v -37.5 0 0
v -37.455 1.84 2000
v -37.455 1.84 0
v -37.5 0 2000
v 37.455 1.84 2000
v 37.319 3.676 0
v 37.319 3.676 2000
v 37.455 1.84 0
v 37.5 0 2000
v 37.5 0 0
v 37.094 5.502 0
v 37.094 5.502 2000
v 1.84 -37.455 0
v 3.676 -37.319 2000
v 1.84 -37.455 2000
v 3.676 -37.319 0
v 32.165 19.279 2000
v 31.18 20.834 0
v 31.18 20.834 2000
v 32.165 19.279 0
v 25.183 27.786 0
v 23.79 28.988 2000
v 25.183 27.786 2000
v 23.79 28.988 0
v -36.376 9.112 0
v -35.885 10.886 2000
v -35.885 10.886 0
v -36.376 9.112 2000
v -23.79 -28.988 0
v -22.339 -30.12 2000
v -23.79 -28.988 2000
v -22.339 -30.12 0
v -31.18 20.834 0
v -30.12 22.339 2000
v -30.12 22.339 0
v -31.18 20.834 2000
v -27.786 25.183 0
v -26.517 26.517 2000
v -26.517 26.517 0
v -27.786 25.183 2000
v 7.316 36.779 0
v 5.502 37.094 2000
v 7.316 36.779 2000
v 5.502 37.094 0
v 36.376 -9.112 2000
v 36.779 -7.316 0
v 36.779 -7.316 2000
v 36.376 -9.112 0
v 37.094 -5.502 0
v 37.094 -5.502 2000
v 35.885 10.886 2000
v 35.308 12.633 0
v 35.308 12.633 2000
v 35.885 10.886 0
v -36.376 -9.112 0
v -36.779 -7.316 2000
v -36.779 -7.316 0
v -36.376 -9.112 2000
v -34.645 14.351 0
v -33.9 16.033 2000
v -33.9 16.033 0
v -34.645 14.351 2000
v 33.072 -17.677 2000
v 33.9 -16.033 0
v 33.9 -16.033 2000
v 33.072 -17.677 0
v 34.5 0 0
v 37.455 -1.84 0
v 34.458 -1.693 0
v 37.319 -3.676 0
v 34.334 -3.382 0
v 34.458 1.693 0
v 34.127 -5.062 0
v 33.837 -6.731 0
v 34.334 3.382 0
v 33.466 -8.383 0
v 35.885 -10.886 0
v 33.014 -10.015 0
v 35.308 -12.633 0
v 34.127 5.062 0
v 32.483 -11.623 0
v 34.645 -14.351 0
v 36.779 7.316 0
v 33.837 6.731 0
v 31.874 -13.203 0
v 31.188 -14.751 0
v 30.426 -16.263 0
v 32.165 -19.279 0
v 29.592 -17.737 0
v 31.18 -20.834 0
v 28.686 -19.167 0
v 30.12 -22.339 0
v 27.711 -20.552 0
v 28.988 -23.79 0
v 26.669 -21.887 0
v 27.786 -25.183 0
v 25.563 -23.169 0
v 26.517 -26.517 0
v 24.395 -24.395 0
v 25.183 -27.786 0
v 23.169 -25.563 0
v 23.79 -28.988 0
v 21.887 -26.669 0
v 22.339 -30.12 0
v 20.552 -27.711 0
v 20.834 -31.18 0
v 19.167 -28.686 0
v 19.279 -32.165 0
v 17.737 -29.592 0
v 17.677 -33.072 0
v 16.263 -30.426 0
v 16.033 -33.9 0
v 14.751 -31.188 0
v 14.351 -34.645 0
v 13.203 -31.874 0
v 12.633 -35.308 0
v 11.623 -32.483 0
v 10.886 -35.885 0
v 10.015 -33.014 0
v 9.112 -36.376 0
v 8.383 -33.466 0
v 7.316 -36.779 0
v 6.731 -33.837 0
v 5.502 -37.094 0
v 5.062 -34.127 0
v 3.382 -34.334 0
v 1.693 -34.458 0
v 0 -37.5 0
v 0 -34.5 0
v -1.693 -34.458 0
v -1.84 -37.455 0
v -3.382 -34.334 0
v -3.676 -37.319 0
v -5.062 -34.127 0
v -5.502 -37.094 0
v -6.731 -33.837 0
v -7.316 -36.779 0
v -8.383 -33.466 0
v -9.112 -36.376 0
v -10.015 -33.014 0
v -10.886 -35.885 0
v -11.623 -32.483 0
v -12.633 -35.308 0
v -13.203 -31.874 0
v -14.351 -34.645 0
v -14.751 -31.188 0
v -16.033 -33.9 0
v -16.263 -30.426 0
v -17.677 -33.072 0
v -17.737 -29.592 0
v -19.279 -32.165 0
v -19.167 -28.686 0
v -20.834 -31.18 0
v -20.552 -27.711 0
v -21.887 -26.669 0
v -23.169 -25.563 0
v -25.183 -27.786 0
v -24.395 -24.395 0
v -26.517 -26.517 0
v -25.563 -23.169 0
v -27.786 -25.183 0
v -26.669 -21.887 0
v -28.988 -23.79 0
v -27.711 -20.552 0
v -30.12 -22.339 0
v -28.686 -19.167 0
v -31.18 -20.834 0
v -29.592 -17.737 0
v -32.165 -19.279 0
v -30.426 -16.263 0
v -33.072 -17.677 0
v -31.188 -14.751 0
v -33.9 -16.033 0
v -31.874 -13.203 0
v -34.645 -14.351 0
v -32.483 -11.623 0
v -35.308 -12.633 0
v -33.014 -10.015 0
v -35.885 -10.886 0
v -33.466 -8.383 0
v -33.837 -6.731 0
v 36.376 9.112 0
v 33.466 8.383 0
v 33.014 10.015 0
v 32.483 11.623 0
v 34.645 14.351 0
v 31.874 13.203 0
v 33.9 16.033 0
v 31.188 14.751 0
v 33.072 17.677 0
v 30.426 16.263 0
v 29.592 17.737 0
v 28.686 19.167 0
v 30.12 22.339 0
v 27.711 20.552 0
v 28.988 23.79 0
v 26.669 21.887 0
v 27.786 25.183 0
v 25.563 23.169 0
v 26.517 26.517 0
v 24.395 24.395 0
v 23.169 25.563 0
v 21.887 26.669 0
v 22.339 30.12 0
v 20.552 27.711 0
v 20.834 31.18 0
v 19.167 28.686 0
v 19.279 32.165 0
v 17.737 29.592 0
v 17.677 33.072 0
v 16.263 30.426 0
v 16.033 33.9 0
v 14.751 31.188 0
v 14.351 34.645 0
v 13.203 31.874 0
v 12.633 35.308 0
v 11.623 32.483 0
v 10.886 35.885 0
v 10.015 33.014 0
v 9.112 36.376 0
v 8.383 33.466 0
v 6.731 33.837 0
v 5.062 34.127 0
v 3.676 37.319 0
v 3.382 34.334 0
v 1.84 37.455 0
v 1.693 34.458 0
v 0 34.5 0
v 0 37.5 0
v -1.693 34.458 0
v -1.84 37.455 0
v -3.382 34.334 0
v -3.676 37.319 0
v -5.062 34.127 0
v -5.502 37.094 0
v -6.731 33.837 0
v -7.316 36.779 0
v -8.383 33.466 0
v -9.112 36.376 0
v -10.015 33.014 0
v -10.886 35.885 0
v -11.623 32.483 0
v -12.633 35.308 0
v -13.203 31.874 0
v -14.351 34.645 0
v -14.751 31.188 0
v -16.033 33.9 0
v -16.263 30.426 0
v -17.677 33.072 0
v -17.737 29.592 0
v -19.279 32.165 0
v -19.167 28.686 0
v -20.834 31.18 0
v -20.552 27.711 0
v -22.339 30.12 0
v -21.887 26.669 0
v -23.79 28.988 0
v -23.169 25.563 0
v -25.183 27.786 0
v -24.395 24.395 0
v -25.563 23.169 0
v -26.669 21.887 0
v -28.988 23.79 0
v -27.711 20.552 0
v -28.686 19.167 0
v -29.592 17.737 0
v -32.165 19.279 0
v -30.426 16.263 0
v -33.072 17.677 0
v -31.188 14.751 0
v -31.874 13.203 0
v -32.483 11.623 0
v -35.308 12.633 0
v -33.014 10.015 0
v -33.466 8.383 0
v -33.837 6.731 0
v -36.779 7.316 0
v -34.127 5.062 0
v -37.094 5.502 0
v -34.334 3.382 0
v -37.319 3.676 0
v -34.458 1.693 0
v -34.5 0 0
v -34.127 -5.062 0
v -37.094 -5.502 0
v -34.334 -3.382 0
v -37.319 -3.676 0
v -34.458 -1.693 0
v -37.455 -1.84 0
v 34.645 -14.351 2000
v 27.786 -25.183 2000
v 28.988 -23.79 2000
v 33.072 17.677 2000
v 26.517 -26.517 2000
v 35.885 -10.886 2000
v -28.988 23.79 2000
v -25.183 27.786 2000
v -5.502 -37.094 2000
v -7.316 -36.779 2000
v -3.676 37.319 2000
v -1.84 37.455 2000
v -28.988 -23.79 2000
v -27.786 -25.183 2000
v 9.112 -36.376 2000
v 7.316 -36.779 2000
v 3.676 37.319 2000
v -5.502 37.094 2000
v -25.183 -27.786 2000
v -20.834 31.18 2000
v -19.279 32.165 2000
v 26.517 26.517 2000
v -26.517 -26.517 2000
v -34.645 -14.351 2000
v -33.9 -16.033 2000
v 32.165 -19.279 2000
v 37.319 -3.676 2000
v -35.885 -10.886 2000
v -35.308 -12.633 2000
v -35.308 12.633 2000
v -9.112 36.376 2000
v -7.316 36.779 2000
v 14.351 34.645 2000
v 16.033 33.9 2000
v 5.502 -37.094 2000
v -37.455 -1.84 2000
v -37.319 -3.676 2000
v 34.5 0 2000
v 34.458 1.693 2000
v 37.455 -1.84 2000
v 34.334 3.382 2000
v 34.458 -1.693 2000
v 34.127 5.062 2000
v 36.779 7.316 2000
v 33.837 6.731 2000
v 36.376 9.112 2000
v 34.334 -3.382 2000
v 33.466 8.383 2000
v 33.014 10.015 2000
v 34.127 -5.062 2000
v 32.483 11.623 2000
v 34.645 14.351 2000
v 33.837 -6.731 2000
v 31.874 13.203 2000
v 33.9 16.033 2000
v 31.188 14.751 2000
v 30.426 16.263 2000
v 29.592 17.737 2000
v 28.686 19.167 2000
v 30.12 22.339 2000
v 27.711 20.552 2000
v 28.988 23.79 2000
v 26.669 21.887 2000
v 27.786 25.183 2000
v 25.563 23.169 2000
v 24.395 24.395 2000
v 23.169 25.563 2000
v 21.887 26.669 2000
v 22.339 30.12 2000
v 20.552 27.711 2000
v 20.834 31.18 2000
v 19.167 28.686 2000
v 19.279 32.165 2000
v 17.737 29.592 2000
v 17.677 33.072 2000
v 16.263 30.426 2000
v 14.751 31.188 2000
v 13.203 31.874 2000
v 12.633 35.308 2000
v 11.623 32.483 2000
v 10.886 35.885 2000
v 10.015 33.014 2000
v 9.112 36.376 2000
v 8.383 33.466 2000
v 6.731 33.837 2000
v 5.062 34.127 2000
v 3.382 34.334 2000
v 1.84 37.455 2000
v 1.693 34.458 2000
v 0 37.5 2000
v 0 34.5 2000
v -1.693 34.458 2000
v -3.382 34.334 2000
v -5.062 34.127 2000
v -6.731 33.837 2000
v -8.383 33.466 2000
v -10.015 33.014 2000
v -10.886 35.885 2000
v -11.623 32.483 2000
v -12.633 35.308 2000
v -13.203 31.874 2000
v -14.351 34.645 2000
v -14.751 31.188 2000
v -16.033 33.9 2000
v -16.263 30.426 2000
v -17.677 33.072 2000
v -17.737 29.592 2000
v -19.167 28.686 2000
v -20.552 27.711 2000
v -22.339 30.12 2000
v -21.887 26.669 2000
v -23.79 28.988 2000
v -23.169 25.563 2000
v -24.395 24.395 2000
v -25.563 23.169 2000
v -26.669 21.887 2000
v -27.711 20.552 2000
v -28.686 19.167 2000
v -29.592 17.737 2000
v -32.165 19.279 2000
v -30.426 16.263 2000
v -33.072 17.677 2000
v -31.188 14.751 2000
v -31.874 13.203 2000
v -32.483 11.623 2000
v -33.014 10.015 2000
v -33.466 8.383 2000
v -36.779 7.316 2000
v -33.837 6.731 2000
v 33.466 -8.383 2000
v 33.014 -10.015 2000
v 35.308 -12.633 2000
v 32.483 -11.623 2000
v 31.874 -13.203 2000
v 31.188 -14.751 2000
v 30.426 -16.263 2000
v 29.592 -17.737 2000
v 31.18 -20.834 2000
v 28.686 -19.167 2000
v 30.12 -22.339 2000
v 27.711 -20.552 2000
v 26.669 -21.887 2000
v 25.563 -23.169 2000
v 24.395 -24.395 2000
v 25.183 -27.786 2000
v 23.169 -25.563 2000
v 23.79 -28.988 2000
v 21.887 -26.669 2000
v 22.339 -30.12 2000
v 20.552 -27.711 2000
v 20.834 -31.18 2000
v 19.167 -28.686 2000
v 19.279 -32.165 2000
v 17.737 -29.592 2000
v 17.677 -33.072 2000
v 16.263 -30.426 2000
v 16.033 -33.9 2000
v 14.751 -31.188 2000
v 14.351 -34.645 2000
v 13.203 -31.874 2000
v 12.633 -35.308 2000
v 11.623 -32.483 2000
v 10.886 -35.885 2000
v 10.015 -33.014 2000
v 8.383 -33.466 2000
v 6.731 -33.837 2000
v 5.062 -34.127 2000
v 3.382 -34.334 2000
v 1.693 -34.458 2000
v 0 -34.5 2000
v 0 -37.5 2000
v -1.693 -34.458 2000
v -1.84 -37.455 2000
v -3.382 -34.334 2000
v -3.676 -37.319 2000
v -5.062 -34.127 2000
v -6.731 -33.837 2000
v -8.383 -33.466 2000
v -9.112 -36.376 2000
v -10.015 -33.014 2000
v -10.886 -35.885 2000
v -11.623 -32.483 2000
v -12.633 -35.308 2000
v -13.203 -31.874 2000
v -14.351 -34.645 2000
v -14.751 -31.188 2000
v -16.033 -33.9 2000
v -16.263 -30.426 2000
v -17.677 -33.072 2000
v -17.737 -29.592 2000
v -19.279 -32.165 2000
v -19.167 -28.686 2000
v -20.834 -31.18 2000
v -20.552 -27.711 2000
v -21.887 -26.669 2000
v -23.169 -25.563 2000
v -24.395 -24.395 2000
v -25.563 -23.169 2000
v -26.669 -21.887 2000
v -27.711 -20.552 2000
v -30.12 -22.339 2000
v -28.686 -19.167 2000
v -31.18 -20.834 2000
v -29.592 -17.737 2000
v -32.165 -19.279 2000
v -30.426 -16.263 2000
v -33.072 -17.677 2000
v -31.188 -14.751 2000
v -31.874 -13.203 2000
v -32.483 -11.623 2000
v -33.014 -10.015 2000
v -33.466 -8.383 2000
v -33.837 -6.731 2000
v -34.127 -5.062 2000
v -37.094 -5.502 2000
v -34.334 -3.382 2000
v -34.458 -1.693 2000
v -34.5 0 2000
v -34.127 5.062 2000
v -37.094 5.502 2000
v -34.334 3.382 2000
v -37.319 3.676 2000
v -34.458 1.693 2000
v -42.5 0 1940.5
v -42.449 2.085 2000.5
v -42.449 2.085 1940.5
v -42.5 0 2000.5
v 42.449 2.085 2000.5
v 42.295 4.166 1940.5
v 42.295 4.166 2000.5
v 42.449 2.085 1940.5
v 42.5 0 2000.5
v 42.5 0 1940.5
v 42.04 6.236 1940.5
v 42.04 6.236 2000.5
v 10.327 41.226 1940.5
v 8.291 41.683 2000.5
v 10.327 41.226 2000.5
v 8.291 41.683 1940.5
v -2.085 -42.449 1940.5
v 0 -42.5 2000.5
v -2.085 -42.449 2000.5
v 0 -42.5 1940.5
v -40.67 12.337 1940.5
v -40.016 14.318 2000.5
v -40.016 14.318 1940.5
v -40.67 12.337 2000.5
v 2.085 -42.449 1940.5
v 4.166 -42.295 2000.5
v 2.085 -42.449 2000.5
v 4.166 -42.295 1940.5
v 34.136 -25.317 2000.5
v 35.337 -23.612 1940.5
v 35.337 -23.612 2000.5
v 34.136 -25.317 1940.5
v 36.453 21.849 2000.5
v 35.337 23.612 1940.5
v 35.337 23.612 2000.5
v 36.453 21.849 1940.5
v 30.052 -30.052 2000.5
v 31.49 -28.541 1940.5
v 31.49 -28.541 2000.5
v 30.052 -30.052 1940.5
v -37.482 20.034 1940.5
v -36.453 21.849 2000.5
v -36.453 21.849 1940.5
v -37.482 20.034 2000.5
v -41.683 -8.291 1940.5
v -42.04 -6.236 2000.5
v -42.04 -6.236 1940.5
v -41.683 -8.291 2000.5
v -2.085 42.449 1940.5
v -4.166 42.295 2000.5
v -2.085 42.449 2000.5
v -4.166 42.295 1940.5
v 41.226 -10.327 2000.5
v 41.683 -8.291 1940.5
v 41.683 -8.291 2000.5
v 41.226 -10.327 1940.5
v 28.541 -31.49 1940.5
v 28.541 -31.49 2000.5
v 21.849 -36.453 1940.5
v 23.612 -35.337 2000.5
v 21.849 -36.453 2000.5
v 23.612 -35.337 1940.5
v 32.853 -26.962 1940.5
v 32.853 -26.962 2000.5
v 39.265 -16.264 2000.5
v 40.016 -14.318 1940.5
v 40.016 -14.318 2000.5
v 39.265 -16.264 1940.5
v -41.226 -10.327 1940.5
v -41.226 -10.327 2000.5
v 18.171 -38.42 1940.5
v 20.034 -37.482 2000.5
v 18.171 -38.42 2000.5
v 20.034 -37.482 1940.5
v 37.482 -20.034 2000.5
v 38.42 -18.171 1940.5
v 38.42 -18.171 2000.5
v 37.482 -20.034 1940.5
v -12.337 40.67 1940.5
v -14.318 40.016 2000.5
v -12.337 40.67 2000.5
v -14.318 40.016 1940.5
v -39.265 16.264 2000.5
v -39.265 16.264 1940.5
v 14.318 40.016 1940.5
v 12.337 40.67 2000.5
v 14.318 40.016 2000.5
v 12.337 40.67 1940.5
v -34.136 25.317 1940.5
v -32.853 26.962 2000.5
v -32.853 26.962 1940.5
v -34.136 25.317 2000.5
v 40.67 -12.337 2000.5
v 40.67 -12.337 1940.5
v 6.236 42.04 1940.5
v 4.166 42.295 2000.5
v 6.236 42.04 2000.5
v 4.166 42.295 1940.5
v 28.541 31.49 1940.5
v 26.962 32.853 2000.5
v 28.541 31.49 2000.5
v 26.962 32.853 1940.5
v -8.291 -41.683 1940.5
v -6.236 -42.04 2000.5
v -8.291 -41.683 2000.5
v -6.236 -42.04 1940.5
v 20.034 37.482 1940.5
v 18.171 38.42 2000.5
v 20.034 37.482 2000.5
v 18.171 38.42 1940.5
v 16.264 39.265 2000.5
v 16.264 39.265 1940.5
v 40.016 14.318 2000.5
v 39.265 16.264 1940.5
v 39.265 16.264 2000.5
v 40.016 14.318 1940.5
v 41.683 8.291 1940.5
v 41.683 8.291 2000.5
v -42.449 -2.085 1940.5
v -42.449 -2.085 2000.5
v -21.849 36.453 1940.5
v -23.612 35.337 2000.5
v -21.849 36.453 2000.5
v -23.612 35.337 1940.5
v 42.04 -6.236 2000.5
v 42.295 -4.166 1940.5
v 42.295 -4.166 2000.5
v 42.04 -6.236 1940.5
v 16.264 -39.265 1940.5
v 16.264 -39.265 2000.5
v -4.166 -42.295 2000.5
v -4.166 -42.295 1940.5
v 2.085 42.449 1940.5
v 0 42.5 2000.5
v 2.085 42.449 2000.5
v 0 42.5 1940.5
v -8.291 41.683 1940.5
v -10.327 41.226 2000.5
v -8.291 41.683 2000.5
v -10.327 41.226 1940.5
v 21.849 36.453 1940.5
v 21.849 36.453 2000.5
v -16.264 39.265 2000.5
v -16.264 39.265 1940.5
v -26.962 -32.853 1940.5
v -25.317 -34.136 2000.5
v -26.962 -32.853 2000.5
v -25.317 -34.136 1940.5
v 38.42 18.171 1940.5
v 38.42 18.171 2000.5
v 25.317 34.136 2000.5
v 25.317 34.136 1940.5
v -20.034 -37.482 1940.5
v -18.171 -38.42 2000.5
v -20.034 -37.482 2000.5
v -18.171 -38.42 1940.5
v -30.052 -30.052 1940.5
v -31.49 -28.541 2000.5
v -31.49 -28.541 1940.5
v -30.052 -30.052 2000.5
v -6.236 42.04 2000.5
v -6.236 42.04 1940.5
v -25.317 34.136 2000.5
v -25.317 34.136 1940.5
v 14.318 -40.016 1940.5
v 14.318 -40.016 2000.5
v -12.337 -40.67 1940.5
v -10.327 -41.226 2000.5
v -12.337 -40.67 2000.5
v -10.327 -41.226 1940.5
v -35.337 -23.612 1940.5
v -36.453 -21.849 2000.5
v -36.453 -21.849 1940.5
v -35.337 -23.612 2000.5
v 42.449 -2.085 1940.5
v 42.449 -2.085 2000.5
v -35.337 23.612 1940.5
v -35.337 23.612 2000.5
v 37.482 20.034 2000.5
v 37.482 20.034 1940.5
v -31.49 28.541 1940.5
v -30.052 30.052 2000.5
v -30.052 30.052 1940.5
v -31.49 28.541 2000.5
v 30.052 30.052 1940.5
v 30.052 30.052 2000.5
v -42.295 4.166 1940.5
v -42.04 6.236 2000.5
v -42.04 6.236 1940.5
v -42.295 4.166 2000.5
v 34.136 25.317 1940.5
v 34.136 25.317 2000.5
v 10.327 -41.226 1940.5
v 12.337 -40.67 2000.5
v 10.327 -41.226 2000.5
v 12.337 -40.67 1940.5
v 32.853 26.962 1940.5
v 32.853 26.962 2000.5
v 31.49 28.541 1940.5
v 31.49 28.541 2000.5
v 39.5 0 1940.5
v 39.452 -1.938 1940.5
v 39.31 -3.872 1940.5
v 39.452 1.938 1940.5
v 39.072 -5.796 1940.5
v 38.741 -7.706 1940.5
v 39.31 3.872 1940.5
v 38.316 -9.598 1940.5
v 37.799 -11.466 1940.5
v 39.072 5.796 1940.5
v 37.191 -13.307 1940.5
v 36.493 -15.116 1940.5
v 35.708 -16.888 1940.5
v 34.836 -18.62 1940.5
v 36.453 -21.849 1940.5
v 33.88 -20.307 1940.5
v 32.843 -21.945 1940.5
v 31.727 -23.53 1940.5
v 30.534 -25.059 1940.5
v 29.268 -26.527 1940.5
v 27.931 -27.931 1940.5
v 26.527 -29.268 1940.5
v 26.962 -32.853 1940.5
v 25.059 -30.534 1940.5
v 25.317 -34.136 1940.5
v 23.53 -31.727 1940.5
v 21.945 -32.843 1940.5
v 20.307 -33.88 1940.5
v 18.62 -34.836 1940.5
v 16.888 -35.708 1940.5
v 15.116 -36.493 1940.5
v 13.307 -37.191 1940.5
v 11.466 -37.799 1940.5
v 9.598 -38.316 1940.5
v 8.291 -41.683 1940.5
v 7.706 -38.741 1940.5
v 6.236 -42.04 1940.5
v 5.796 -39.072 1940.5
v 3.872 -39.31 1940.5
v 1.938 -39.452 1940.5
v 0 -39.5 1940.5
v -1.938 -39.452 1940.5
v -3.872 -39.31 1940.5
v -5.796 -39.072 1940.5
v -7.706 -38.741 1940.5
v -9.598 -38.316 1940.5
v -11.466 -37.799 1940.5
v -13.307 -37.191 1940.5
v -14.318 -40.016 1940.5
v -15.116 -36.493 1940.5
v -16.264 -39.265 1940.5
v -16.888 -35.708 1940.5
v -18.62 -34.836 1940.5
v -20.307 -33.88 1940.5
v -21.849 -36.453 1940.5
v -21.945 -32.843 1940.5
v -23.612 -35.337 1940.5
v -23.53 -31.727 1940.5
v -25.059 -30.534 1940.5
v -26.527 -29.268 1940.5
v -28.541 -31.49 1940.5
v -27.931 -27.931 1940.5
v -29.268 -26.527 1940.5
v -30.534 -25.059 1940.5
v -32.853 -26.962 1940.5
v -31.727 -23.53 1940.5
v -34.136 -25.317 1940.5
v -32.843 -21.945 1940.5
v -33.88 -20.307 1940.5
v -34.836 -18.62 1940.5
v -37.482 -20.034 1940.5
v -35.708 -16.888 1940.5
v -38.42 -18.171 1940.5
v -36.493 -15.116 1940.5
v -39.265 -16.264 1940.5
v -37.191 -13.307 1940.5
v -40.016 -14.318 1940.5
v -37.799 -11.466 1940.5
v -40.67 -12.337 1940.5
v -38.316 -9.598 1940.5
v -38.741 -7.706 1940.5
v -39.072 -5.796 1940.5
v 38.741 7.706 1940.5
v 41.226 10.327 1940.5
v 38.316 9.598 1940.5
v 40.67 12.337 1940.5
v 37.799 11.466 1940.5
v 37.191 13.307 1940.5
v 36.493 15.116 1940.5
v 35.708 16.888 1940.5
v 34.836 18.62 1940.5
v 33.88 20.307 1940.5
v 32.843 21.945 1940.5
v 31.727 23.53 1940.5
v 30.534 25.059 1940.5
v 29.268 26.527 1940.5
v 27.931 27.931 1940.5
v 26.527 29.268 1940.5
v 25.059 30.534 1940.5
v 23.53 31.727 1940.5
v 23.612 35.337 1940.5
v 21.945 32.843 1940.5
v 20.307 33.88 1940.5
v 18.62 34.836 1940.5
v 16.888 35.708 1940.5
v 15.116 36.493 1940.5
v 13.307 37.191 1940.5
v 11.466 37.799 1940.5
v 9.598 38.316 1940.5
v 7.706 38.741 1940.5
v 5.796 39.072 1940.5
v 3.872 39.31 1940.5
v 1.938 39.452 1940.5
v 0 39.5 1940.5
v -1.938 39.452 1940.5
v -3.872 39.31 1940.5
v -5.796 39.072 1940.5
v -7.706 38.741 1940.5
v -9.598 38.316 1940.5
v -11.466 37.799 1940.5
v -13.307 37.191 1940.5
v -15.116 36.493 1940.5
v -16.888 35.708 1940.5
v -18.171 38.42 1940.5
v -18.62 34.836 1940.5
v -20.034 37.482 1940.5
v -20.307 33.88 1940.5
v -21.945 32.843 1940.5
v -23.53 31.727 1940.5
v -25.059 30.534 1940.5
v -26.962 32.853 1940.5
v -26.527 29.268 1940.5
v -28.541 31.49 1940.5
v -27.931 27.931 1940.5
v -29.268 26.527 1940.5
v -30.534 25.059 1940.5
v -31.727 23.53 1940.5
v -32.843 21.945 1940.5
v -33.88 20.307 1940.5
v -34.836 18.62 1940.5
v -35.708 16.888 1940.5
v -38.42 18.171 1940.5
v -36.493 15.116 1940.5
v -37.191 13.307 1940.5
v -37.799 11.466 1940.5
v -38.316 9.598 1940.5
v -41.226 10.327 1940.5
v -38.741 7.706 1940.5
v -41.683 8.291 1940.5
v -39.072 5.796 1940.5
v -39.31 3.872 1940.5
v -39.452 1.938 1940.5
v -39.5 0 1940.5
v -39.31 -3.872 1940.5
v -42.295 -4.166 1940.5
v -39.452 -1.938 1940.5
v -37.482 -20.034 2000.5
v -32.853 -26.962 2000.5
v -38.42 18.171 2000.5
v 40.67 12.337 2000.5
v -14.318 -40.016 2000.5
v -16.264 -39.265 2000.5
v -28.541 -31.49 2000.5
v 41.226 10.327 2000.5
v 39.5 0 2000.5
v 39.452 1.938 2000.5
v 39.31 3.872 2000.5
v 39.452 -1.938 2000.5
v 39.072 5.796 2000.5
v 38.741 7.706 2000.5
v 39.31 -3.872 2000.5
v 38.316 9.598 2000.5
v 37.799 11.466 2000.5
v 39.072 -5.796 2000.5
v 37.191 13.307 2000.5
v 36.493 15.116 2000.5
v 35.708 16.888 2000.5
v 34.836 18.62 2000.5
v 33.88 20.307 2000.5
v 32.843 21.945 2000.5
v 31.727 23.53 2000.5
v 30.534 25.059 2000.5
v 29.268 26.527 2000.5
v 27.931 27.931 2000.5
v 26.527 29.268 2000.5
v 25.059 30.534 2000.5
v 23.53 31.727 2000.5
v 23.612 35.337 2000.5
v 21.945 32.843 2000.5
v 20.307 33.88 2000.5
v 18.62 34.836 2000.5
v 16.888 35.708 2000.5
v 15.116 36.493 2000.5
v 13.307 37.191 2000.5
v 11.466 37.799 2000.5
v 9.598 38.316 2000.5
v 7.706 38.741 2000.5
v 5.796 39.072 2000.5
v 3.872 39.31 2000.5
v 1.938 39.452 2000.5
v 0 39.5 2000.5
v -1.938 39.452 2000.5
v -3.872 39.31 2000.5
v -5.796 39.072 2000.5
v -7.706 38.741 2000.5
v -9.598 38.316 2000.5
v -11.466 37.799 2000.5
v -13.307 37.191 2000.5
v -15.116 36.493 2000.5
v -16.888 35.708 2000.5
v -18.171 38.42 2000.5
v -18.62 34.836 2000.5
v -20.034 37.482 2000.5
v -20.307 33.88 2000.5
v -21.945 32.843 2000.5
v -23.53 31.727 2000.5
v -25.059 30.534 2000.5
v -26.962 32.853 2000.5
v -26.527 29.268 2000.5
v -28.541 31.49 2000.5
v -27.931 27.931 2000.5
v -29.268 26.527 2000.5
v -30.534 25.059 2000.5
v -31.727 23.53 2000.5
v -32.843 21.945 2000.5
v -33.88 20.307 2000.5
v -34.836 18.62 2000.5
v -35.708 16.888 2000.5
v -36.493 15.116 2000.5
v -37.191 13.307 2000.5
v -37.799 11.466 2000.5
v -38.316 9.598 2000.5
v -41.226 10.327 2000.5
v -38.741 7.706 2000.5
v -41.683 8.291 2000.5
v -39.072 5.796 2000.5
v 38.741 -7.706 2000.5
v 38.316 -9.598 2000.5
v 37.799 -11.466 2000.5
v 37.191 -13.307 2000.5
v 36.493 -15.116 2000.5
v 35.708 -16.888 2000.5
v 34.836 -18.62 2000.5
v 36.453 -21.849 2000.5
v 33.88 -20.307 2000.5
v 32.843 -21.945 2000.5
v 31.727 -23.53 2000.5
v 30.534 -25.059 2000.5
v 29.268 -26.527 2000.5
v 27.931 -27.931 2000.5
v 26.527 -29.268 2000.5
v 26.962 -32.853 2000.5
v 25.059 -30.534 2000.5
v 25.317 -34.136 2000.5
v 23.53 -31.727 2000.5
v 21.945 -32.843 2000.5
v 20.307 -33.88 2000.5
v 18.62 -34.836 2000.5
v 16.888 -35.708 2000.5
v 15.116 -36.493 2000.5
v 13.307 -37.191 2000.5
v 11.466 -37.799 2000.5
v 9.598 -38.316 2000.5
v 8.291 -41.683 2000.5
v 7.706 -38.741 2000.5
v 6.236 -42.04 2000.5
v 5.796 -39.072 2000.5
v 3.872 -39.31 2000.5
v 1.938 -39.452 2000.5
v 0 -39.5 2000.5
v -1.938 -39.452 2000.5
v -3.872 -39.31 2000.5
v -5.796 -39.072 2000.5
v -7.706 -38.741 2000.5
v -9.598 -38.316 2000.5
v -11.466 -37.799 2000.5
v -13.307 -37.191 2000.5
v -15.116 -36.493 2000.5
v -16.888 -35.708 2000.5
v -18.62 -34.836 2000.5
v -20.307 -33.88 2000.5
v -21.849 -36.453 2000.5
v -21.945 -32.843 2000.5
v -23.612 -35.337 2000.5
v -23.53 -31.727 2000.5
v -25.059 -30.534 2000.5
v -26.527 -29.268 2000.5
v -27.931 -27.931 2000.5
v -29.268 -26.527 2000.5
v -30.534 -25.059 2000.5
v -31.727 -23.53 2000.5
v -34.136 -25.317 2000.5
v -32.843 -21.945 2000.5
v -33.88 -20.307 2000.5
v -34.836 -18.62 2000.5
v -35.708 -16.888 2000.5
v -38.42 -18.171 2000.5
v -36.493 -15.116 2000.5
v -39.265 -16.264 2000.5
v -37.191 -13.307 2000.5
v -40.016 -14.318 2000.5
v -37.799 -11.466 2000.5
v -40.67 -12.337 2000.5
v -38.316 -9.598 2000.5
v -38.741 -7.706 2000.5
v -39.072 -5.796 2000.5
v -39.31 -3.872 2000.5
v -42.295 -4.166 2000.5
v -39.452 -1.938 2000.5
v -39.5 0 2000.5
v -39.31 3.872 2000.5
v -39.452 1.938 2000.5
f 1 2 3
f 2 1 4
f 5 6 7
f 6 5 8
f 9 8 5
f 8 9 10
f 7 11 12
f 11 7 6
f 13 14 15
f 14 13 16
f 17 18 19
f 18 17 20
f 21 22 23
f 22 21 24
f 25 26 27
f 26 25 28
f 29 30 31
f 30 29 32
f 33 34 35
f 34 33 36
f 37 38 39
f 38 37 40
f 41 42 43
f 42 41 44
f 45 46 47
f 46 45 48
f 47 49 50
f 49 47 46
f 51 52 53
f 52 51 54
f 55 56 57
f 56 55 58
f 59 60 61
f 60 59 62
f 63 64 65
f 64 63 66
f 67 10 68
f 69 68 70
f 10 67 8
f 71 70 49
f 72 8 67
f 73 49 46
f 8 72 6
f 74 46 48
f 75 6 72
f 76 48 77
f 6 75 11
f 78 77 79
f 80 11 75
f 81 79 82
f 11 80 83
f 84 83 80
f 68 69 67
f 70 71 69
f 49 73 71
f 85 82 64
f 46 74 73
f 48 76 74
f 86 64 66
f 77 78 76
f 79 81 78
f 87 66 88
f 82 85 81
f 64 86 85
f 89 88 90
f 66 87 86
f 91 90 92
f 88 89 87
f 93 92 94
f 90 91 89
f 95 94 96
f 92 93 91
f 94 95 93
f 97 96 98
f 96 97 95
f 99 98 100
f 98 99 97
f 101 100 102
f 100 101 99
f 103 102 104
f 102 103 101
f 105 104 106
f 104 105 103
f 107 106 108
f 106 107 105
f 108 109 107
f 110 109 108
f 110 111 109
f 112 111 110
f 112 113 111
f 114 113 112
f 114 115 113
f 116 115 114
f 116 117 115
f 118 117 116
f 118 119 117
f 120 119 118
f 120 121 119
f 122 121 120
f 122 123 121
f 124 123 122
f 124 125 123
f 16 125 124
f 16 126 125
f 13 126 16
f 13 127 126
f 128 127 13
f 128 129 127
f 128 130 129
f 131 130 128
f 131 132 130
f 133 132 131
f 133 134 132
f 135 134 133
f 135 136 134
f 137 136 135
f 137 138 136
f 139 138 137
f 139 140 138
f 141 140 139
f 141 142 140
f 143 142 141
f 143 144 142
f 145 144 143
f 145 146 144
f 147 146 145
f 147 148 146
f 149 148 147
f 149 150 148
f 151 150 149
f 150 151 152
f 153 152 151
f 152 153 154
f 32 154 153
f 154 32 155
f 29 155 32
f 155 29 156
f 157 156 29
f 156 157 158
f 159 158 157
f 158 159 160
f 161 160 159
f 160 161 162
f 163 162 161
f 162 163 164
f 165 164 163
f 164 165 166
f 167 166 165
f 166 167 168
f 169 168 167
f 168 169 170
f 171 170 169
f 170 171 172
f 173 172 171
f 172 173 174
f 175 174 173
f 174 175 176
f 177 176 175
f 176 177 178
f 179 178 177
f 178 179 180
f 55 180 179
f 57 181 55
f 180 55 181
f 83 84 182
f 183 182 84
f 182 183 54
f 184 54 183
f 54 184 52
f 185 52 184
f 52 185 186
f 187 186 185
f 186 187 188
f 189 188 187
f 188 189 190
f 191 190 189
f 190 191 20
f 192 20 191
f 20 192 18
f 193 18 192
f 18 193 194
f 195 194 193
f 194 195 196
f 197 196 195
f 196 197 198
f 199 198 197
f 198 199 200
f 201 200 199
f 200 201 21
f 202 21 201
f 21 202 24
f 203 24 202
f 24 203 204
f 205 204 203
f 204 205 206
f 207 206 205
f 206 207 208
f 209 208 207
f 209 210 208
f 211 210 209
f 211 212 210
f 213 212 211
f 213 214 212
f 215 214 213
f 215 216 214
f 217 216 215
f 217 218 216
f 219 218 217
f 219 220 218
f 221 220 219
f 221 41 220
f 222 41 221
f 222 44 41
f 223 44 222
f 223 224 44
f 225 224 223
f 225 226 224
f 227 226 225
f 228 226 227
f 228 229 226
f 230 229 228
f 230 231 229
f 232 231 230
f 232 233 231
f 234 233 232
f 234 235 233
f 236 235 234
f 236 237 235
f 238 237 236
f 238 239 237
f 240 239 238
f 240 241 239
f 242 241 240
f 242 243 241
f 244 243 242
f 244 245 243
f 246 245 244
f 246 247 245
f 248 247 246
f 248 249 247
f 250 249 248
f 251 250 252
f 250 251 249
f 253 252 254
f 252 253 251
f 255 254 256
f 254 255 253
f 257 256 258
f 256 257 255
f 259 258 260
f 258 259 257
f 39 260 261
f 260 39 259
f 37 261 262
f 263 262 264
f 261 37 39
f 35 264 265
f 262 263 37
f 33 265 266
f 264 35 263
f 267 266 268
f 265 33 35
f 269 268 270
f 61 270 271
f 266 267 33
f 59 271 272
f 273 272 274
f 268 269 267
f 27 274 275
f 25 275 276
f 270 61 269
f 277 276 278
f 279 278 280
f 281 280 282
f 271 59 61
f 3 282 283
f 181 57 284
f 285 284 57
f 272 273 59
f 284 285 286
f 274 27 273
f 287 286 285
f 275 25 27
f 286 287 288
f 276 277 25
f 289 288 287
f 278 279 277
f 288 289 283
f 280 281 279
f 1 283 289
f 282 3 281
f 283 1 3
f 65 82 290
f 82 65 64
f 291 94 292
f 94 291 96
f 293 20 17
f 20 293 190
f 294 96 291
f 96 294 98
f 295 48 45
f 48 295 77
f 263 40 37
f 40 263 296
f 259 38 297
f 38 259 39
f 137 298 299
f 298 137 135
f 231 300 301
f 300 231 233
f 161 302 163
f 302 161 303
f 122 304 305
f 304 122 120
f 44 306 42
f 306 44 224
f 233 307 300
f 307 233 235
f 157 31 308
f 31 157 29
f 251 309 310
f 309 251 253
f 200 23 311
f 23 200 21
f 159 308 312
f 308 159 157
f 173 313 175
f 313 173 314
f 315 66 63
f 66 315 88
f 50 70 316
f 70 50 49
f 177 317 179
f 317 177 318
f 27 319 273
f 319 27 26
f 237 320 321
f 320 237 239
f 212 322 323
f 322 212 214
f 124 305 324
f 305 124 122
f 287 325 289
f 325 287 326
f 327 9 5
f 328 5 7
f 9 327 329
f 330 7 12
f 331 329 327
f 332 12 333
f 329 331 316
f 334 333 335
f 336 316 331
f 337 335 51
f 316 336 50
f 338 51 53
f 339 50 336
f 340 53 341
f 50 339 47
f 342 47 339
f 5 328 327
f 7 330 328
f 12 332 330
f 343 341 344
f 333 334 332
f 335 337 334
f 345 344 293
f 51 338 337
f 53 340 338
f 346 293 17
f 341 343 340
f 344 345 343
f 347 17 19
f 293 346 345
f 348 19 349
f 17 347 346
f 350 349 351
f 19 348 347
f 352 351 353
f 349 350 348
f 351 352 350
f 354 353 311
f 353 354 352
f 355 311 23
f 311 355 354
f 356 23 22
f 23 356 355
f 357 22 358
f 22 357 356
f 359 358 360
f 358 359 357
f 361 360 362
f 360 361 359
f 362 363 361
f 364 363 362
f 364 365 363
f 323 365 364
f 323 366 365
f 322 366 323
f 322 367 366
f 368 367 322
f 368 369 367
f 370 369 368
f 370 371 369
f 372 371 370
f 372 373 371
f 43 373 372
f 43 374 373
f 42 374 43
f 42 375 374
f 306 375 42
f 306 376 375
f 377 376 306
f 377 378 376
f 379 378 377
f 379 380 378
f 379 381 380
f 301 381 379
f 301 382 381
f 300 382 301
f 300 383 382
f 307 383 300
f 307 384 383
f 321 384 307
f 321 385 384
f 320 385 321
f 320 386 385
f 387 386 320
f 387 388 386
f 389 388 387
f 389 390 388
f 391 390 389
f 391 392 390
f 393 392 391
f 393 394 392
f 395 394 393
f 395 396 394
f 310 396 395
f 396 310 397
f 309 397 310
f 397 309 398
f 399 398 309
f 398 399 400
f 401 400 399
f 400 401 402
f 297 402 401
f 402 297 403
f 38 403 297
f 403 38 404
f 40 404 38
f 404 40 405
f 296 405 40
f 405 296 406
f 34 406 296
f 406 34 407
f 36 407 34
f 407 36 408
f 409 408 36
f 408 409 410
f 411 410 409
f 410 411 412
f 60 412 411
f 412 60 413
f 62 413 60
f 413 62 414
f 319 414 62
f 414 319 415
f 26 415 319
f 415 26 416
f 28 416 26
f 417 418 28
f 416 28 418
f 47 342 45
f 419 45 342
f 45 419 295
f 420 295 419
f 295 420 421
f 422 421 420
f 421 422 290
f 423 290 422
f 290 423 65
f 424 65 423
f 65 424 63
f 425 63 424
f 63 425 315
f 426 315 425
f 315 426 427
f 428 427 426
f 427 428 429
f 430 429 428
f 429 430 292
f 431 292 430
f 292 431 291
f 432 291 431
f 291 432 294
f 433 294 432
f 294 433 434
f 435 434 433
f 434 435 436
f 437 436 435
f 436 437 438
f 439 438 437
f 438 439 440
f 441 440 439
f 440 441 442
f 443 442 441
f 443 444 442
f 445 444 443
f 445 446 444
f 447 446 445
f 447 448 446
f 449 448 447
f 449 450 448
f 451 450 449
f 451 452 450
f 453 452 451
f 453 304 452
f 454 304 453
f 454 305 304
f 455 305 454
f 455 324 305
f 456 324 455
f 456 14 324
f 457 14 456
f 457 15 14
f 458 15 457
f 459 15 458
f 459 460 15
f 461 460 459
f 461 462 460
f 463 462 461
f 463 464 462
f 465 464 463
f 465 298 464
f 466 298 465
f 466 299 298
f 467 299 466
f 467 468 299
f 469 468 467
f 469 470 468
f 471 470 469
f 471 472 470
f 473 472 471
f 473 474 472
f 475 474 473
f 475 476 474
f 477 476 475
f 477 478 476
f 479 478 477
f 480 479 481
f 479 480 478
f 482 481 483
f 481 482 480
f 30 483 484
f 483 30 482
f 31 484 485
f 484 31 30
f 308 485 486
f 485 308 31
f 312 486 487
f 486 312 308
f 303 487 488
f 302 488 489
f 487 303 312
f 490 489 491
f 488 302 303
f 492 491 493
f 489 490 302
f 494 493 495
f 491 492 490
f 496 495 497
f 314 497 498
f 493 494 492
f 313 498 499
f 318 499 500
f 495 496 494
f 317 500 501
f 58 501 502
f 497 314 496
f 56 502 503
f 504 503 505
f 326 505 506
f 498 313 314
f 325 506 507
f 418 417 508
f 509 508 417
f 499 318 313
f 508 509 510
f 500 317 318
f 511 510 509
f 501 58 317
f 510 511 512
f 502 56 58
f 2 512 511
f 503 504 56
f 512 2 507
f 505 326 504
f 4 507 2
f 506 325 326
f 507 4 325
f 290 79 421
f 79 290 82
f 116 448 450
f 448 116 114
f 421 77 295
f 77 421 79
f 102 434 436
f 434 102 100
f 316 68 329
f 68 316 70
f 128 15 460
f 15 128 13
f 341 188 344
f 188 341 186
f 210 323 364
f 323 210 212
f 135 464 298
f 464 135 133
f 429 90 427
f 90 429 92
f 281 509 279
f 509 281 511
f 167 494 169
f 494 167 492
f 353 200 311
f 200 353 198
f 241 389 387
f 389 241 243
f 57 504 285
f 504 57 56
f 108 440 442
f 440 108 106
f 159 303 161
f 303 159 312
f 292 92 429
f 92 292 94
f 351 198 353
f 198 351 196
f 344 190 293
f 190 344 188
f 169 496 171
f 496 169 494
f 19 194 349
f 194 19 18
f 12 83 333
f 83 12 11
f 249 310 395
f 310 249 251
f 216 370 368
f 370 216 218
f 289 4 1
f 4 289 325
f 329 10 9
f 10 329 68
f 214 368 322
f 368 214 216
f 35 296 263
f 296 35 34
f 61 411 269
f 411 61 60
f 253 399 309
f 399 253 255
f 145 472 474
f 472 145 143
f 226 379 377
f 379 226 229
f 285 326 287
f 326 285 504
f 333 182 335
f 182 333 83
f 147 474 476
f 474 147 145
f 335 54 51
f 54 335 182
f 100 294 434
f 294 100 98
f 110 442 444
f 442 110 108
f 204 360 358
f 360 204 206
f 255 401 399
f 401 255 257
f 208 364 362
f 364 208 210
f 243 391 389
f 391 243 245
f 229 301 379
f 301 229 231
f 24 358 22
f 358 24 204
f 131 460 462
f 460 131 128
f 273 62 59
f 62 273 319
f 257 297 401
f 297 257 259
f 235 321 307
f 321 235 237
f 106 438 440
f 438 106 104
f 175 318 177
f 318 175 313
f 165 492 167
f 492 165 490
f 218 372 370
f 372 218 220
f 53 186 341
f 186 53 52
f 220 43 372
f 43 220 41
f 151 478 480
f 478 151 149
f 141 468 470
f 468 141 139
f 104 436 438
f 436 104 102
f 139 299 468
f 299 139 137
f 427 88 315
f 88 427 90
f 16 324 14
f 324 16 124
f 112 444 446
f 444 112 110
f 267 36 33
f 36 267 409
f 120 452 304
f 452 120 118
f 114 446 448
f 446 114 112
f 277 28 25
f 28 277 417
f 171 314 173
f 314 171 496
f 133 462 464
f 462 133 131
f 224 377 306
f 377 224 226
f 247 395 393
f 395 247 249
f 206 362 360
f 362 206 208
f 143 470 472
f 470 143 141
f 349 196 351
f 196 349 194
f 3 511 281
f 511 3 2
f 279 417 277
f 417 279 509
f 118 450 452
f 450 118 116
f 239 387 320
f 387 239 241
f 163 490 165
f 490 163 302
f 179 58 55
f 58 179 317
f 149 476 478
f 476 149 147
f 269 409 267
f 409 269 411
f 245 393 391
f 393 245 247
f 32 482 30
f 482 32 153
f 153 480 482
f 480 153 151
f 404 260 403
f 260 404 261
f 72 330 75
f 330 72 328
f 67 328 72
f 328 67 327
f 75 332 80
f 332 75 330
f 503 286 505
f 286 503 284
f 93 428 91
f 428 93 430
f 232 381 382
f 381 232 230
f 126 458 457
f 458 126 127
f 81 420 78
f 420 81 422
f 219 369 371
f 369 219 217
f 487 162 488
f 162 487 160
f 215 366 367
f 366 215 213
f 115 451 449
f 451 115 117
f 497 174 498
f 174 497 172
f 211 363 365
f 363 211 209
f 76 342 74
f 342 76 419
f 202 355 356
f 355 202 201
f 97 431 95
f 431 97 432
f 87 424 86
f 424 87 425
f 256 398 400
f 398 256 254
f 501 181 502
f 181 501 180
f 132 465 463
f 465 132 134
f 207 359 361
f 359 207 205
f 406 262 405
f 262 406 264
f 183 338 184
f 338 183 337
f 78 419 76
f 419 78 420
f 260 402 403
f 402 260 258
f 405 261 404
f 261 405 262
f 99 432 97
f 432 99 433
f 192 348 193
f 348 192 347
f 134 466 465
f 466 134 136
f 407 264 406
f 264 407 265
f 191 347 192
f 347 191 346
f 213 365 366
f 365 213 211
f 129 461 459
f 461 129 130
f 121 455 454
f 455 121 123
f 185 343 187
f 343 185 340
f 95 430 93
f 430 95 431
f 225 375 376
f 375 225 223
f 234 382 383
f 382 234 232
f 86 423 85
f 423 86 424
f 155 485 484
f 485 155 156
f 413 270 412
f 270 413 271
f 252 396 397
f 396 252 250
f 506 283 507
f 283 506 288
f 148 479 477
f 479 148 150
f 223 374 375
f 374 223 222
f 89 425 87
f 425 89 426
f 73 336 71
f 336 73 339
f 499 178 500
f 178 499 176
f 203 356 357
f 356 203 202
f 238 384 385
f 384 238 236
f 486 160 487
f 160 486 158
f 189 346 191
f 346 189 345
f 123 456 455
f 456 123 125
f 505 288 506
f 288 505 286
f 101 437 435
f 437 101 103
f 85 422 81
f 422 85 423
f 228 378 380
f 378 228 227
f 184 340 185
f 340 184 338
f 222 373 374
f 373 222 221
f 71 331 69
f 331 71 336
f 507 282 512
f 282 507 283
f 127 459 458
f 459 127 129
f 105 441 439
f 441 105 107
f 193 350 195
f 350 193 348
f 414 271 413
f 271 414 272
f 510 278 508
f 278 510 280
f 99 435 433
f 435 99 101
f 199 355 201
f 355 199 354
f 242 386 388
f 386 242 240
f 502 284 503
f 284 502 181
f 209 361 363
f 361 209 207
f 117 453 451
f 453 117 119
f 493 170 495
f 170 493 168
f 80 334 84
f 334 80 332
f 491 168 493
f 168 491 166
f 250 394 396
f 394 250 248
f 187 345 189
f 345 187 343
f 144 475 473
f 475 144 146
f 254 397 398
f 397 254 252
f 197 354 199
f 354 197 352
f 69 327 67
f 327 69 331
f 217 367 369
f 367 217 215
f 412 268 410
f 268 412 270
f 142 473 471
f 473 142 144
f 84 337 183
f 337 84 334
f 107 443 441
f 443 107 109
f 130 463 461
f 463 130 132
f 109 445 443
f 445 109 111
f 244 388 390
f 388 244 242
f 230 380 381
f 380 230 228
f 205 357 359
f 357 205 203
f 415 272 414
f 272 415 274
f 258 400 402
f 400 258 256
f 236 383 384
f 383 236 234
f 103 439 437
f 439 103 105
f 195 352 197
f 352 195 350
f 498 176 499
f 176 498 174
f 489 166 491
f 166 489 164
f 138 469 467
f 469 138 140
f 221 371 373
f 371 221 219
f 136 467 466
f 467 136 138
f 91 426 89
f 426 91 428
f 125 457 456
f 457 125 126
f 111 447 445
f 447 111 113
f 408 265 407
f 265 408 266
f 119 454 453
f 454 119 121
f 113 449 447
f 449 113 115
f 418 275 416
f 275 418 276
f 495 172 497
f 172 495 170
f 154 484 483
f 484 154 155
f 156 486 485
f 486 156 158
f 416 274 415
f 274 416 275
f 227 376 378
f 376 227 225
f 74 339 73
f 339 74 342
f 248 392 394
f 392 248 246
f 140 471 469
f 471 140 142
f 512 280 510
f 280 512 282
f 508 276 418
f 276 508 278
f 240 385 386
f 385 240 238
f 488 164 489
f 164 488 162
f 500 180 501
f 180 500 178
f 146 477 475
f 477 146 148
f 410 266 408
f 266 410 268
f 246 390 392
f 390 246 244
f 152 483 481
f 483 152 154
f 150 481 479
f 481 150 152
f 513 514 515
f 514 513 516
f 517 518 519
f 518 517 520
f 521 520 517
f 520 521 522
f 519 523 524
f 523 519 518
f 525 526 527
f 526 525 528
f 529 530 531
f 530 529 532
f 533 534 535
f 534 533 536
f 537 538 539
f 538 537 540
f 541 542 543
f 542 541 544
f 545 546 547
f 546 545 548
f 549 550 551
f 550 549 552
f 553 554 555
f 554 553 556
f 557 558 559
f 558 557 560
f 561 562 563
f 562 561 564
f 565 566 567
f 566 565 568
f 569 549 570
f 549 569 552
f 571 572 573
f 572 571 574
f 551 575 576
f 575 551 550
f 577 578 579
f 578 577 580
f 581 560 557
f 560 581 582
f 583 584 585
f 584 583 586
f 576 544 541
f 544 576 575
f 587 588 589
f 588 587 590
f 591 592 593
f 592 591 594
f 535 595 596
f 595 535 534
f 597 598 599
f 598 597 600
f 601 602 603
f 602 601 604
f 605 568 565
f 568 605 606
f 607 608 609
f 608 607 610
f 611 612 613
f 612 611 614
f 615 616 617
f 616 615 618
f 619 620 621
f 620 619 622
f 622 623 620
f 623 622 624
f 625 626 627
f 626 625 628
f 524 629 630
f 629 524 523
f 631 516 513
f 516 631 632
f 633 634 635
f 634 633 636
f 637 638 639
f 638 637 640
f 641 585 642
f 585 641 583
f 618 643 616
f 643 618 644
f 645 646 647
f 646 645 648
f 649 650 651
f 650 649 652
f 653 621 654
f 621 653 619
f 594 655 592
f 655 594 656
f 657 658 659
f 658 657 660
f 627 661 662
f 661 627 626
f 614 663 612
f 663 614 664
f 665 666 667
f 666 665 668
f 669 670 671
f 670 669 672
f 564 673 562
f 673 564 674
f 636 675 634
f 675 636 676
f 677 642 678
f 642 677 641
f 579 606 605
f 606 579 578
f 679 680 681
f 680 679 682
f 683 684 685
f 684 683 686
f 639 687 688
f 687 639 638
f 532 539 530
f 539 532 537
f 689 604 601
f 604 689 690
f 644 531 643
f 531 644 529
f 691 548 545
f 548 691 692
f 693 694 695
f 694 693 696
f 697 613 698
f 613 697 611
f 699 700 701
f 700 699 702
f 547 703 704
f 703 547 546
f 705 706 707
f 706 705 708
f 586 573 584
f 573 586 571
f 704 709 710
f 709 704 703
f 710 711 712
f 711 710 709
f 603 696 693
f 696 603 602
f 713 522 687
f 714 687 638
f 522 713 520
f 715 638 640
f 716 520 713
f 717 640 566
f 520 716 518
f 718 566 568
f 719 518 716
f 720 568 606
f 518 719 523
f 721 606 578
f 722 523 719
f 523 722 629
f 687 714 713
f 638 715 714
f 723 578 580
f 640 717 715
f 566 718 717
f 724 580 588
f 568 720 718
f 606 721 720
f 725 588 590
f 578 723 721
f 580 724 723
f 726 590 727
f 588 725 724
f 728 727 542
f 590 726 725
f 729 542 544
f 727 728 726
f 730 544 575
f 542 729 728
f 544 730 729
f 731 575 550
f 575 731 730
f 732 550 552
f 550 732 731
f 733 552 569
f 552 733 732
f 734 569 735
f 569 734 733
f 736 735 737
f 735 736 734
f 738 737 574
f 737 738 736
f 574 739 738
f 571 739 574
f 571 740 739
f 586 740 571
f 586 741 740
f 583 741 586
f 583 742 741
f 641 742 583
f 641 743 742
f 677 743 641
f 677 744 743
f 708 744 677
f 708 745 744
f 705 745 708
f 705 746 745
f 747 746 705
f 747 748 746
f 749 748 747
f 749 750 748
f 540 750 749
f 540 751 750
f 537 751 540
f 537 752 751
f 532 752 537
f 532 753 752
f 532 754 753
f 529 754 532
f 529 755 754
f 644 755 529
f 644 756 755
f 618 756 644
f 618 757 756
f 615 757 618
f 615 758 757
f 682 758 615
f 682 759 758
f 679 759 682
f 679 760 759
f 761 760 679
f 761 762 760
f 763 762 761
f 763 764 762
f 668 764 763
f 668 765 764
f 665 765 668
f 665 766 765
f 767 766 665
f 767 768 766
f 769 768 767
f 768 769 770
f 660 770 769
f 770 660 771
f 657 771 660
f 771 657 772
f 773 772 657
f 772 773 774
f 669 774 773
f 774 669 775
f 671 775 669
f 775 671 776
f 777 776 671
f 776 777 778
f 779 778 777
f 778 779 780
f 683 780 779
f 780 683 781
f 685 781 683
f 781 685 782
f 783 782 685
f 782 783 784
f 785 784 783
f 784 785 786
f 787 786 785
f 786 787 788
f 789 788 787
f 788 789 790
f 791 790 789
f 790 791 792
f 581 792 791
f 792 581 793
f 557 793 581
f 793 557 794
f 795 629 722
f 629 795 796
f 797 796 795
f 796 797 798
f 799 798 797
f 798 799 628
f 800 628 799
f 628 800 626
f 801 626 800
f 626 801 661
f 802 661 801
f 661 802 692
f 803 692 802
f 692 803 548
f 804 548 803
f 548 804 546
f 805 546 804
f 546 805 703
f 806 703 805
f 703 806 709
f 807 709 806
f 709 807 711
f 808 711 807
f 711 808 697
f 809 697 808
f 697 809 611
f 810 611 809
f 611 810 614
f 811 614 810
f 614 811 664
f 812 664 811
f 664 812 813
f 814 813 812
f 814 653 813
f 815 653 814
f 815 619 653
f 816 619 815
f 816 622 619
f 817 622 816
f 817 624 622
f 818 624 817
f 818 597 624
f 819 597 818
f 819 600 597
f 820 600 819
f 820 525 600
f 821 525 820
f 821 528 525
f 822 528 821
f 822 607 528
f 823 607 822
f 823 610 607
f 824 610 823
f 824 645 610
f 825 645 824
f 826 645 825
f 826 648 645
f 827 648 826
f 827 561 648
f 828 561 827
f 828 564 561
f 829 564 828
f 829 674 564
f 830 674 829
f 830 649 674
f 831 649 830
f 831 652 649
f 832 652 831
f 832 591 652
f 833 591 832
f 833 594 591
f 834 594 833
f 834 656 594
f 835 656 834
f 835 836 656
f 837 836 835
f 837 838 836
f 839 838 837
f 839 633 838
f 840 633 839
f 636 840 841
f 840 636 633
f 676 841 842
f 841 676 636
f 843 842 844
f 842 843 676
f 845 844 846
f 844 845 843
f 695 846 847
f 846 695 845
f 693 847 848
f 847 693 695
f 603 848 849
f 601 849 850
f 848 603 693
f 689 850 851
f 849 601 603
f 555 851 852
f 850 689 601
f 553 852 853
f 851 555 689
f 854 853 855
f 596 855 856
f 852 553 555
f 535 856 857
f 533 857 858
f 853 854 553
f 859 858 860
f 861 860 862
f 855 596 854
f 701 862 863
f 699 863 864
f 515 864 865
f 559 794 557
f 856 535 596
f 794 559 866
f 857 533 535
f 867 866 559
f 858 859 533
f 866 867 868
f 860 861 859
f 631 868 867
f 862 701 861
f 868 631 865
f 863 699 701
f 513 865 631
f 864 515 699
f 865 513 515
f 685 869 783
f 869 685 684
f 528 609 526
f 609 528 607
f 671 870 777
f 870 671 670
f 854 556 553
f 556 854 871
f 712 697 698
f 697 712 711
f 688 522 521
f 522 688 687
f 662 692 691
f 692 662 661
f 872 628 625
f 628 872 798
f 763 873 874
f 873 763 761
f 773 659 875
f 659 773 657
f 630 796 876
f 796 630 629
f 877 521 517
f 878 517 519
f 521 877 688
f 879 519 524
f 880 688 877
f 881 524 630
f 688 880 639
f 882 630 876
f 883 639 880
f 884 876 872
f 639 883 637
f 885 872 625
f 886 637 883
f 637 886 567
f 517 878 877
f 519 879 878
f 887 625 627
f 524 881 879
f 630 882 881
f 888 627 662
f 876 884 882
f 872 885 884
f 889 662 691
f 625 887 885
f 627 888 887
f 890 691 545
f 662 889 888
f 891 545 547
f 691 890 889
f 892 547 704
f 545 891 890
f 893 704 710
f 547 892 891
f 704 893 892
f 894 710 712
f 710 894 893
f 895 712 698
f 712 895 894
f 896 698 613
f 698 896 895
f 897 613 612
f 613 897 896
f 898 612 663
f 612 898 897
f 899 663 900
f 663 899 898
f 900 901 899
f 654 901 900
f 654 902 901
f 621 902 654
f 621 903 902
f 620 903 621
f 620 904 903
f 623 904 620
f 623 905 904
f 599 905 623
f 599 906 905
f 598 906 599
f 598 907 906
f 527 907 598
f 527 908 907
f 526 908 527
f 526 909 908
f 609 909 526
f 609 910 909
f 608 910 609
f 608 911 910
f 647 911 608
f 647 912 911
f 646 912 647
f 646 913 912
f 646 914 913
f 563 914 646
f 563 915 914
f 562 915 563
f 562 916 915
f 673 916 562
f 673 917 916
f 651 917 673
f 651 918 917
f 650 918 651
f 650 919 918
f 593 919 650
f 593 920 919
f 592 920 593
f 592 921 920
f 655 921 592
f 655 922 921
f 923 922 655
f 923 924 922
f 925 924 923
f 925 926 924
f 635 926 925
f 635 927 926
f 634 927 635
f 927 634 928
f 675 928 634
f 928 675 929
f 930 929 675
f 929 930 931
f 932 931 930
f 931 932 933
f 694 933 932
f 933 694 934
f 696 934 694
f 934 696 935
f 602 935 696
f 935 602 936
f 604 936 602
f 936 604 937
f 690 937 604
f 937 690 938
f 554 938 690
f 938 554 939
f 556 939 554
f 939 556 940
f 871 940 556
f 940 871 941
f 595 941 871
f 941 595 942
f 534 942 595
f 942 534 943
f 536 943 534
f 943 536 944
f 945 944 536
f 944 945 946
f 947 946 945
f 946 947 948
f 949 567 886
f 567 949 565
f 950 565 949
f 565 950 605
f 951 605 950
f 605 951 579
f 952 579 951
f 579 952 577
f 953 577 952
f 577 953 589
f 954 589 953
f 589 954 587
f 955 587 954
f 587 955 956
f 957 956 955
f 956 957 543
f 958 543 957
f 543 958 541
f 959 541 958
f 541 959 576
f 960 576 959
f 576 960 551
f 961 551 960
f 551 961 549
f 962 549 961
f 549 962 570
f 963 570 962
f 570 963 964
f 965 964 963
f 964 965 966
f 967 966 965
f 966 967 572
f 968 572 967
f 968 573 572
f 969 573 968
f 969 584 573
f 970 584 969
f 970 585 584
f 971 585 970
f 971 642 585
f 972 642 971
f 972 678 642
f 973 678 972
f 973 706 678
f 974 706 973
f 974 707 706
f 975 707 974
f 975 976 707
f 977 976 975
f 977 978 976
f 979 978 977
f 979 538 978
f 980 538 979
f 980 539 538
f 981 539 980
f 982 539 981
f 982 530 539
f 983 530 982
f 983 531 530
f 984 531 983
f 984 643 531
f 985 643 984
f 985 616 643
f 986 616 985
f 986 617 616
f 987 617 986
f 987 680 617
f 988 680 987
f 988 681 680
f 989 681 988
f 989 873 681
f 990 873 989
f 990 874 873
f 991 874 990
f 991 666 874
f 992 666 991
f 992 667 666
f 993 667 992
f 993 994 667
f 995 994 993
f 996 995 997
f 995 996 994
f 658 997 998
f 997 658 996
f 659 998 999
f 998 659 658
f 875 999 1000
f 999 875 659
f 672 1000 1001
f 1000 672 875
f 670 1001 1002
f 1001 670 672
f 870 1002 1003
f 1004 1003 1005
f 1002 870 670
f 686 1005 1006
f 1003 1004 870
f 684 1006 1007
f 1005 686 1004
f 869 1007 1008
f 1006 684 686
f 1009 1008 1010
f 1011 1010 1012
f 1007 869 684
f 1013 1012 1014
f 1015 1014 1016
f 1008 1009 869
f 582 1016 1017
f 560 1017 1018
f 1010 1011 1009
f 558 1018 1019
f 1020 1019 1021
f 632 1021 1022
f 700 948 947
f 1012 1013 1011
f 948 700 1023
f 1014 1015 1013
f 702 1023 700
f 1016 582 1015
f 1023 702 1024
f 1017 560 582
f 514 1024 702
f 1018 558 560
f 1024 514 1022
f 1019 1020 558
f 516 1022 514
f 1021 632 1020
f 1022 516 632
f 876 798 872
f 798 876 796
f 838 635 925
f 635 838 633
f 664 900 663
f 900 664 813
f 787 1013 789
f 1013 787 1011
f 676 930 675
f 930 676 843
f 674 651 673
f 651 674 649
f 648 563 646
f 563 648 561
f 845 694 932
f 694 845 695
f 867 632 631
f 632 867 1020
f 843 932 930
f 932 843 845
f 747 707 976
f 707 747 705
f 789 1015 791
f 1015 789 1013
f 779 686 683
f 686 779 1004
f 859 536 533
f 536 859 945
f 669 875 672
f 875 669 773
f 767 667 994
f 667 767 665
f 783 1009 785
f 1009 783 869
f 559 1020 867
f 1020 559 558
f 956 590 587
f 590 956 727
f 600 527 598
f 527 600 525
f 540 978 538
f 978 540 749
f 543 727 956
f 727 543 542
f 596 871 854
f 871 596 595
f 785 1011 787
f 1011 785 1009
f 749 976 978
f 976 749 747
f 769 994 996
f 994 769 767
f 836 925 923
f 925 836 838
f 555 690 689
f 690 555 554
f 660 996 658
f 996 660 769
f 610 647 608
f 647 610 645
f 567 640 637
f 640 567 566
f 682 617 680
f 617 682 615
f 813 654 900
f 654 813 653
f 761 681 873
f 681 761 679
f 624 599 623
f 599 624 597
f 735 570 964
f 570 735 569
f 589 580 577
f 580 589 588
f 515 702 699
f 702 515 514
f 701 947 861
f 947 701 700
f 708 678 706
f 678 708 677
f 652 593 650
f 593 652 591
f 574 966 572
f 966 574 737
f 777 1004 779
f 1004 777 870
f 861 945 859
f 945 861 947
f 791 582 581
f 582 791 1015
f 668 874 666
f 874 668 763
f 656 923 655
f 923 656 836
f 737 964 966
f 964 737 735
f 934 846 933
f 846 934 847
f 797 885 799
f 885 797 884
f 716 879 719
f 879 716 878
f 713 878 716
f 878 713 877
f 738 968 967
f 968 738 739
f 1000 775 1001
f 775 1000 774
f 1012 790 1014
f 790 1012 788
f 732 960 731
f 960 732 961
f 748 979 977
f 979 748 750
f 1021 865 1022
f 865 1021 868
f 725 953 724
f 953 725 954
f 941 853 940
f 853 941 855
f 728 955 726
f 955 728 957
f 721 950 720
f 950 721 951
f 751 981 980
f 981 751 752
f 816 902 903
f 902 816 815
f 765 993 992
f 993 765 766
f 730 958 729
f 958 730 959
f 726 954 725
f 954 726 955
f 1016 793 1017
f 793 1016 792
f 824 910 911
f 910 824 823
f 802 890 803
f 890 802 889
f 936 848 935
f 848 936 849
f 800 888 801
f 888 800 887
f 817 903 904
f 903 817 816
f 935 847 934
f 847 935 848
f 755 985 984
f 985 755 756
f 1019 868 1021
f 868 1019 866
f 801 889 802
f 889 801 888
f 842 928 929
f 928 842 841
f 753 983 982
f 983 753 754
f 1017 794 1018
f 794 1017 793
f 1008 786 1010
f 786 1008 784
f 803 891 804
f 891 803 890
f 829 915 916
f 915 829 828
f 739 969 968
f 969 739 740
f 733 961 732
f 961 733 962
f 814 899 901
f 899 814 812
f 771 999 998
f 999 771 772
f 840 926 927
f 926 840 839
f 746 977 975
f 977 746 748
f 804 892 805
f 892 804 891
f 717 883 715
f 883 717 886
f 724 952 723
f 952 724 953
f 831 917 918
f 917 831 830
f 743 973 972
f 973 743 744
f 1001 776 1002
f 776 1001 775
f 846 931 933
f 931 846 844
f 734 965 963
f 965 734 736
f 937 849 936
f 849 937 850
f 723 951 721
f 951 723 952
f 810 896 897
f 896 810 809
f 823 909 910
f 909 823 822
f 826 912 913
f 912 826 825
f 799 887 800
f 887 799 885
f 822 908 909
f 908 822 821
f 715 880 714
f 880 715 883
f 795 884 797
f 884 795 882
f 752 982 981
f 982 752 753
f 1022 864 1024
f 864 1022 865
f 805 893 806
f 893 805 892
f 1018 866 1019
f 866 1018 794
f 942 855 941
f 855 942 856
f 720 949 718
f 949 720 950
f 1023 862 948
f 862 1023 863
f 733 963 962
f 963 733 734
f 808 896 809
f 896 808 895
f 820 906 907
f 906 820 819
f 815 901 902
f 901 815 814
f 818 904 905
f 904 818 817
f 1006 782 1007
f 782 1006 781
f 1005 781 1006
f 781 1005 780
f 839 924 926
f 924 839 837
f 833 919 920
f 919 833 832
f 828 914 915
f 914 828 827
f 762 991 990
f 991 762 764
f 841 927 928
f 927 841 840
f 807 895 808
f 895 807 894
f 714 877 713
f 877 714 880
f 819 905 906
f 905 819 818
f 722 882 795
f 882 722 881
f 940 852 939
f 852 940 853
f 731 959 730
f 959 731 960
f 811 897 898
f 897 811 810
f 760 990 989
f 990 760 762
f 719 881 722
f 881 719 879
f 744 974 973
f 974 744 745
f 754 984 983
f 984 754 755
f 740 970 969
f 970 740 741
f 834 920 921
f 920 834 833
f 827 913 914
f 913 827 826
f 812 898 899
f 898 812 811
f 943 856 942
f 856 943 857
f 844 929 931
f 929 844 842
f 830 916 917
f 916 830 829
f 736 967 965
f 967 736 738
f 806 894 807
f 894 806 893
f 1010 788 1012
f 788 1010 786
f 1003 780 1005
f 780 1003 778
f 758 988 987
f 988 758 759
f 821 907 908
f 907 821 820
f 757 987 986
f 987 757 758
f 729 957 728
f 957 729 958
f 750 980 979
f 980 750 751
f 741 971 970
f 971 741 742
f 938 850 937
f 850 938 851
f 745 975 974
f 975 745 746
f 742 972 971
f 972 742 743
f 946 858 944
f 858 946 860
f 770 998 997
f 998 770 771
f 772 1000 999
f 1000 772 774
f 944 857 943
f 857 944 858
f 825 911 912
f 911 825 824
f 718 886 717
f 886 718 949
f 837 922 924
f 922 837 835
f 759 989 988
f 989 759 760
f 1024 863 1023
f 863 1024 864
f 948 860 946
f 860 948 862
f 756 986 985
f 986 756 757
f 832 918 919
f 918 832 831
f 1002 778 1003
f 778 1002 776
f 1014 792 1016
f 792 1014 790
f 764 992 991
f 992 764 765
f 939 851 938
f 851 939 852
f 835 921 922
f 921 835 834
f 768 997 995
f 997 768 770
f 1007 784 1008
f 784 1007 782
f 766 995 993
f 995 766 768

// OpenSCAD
// HT 75 pipe 2000 mm (single connected solid)

// Parameters
pipe_diameter  = 75;    // outer diameter (mm)
pipe_thickness = 3;     // wall thickness (mm)
pipe_length    = 2000;  // overall length (mm)

// Simple socket at one end (typical HT pipe)
socket_len     = 60;    // socket length (mm)
socket_extra_d = 10;    // socket OD increase (mm)

$fn = 128;

module ht_pipe() {
    od = pipe_diameter;
    id = od - 2*pipe_thickness;

    socket_od = od + socket_extra_d;
    socket_id = socket_od - 2*pipe_thickness;

    overlap = 0.5; // ensures union connectivity (no coincident faces)

    union() {
        // Main pipe body (hollow)
        difference() {
            cylinder(h=pipe_length, d=od);
            translate([0,0,-1])
                cylinder(h=pipe_length+2, d=id);
        }

        // Socket at one end (hollow), overlapping into main body
        translate([0,0,pipe_length - socket_len + overlap])
        difference() {
            cylinder(h=socket_len, d=socket_od);
            translate([0,0,-1])
                cylinder(h=socket_len+2, d=socket_id);
        }
    }
}

ht_pipe();
